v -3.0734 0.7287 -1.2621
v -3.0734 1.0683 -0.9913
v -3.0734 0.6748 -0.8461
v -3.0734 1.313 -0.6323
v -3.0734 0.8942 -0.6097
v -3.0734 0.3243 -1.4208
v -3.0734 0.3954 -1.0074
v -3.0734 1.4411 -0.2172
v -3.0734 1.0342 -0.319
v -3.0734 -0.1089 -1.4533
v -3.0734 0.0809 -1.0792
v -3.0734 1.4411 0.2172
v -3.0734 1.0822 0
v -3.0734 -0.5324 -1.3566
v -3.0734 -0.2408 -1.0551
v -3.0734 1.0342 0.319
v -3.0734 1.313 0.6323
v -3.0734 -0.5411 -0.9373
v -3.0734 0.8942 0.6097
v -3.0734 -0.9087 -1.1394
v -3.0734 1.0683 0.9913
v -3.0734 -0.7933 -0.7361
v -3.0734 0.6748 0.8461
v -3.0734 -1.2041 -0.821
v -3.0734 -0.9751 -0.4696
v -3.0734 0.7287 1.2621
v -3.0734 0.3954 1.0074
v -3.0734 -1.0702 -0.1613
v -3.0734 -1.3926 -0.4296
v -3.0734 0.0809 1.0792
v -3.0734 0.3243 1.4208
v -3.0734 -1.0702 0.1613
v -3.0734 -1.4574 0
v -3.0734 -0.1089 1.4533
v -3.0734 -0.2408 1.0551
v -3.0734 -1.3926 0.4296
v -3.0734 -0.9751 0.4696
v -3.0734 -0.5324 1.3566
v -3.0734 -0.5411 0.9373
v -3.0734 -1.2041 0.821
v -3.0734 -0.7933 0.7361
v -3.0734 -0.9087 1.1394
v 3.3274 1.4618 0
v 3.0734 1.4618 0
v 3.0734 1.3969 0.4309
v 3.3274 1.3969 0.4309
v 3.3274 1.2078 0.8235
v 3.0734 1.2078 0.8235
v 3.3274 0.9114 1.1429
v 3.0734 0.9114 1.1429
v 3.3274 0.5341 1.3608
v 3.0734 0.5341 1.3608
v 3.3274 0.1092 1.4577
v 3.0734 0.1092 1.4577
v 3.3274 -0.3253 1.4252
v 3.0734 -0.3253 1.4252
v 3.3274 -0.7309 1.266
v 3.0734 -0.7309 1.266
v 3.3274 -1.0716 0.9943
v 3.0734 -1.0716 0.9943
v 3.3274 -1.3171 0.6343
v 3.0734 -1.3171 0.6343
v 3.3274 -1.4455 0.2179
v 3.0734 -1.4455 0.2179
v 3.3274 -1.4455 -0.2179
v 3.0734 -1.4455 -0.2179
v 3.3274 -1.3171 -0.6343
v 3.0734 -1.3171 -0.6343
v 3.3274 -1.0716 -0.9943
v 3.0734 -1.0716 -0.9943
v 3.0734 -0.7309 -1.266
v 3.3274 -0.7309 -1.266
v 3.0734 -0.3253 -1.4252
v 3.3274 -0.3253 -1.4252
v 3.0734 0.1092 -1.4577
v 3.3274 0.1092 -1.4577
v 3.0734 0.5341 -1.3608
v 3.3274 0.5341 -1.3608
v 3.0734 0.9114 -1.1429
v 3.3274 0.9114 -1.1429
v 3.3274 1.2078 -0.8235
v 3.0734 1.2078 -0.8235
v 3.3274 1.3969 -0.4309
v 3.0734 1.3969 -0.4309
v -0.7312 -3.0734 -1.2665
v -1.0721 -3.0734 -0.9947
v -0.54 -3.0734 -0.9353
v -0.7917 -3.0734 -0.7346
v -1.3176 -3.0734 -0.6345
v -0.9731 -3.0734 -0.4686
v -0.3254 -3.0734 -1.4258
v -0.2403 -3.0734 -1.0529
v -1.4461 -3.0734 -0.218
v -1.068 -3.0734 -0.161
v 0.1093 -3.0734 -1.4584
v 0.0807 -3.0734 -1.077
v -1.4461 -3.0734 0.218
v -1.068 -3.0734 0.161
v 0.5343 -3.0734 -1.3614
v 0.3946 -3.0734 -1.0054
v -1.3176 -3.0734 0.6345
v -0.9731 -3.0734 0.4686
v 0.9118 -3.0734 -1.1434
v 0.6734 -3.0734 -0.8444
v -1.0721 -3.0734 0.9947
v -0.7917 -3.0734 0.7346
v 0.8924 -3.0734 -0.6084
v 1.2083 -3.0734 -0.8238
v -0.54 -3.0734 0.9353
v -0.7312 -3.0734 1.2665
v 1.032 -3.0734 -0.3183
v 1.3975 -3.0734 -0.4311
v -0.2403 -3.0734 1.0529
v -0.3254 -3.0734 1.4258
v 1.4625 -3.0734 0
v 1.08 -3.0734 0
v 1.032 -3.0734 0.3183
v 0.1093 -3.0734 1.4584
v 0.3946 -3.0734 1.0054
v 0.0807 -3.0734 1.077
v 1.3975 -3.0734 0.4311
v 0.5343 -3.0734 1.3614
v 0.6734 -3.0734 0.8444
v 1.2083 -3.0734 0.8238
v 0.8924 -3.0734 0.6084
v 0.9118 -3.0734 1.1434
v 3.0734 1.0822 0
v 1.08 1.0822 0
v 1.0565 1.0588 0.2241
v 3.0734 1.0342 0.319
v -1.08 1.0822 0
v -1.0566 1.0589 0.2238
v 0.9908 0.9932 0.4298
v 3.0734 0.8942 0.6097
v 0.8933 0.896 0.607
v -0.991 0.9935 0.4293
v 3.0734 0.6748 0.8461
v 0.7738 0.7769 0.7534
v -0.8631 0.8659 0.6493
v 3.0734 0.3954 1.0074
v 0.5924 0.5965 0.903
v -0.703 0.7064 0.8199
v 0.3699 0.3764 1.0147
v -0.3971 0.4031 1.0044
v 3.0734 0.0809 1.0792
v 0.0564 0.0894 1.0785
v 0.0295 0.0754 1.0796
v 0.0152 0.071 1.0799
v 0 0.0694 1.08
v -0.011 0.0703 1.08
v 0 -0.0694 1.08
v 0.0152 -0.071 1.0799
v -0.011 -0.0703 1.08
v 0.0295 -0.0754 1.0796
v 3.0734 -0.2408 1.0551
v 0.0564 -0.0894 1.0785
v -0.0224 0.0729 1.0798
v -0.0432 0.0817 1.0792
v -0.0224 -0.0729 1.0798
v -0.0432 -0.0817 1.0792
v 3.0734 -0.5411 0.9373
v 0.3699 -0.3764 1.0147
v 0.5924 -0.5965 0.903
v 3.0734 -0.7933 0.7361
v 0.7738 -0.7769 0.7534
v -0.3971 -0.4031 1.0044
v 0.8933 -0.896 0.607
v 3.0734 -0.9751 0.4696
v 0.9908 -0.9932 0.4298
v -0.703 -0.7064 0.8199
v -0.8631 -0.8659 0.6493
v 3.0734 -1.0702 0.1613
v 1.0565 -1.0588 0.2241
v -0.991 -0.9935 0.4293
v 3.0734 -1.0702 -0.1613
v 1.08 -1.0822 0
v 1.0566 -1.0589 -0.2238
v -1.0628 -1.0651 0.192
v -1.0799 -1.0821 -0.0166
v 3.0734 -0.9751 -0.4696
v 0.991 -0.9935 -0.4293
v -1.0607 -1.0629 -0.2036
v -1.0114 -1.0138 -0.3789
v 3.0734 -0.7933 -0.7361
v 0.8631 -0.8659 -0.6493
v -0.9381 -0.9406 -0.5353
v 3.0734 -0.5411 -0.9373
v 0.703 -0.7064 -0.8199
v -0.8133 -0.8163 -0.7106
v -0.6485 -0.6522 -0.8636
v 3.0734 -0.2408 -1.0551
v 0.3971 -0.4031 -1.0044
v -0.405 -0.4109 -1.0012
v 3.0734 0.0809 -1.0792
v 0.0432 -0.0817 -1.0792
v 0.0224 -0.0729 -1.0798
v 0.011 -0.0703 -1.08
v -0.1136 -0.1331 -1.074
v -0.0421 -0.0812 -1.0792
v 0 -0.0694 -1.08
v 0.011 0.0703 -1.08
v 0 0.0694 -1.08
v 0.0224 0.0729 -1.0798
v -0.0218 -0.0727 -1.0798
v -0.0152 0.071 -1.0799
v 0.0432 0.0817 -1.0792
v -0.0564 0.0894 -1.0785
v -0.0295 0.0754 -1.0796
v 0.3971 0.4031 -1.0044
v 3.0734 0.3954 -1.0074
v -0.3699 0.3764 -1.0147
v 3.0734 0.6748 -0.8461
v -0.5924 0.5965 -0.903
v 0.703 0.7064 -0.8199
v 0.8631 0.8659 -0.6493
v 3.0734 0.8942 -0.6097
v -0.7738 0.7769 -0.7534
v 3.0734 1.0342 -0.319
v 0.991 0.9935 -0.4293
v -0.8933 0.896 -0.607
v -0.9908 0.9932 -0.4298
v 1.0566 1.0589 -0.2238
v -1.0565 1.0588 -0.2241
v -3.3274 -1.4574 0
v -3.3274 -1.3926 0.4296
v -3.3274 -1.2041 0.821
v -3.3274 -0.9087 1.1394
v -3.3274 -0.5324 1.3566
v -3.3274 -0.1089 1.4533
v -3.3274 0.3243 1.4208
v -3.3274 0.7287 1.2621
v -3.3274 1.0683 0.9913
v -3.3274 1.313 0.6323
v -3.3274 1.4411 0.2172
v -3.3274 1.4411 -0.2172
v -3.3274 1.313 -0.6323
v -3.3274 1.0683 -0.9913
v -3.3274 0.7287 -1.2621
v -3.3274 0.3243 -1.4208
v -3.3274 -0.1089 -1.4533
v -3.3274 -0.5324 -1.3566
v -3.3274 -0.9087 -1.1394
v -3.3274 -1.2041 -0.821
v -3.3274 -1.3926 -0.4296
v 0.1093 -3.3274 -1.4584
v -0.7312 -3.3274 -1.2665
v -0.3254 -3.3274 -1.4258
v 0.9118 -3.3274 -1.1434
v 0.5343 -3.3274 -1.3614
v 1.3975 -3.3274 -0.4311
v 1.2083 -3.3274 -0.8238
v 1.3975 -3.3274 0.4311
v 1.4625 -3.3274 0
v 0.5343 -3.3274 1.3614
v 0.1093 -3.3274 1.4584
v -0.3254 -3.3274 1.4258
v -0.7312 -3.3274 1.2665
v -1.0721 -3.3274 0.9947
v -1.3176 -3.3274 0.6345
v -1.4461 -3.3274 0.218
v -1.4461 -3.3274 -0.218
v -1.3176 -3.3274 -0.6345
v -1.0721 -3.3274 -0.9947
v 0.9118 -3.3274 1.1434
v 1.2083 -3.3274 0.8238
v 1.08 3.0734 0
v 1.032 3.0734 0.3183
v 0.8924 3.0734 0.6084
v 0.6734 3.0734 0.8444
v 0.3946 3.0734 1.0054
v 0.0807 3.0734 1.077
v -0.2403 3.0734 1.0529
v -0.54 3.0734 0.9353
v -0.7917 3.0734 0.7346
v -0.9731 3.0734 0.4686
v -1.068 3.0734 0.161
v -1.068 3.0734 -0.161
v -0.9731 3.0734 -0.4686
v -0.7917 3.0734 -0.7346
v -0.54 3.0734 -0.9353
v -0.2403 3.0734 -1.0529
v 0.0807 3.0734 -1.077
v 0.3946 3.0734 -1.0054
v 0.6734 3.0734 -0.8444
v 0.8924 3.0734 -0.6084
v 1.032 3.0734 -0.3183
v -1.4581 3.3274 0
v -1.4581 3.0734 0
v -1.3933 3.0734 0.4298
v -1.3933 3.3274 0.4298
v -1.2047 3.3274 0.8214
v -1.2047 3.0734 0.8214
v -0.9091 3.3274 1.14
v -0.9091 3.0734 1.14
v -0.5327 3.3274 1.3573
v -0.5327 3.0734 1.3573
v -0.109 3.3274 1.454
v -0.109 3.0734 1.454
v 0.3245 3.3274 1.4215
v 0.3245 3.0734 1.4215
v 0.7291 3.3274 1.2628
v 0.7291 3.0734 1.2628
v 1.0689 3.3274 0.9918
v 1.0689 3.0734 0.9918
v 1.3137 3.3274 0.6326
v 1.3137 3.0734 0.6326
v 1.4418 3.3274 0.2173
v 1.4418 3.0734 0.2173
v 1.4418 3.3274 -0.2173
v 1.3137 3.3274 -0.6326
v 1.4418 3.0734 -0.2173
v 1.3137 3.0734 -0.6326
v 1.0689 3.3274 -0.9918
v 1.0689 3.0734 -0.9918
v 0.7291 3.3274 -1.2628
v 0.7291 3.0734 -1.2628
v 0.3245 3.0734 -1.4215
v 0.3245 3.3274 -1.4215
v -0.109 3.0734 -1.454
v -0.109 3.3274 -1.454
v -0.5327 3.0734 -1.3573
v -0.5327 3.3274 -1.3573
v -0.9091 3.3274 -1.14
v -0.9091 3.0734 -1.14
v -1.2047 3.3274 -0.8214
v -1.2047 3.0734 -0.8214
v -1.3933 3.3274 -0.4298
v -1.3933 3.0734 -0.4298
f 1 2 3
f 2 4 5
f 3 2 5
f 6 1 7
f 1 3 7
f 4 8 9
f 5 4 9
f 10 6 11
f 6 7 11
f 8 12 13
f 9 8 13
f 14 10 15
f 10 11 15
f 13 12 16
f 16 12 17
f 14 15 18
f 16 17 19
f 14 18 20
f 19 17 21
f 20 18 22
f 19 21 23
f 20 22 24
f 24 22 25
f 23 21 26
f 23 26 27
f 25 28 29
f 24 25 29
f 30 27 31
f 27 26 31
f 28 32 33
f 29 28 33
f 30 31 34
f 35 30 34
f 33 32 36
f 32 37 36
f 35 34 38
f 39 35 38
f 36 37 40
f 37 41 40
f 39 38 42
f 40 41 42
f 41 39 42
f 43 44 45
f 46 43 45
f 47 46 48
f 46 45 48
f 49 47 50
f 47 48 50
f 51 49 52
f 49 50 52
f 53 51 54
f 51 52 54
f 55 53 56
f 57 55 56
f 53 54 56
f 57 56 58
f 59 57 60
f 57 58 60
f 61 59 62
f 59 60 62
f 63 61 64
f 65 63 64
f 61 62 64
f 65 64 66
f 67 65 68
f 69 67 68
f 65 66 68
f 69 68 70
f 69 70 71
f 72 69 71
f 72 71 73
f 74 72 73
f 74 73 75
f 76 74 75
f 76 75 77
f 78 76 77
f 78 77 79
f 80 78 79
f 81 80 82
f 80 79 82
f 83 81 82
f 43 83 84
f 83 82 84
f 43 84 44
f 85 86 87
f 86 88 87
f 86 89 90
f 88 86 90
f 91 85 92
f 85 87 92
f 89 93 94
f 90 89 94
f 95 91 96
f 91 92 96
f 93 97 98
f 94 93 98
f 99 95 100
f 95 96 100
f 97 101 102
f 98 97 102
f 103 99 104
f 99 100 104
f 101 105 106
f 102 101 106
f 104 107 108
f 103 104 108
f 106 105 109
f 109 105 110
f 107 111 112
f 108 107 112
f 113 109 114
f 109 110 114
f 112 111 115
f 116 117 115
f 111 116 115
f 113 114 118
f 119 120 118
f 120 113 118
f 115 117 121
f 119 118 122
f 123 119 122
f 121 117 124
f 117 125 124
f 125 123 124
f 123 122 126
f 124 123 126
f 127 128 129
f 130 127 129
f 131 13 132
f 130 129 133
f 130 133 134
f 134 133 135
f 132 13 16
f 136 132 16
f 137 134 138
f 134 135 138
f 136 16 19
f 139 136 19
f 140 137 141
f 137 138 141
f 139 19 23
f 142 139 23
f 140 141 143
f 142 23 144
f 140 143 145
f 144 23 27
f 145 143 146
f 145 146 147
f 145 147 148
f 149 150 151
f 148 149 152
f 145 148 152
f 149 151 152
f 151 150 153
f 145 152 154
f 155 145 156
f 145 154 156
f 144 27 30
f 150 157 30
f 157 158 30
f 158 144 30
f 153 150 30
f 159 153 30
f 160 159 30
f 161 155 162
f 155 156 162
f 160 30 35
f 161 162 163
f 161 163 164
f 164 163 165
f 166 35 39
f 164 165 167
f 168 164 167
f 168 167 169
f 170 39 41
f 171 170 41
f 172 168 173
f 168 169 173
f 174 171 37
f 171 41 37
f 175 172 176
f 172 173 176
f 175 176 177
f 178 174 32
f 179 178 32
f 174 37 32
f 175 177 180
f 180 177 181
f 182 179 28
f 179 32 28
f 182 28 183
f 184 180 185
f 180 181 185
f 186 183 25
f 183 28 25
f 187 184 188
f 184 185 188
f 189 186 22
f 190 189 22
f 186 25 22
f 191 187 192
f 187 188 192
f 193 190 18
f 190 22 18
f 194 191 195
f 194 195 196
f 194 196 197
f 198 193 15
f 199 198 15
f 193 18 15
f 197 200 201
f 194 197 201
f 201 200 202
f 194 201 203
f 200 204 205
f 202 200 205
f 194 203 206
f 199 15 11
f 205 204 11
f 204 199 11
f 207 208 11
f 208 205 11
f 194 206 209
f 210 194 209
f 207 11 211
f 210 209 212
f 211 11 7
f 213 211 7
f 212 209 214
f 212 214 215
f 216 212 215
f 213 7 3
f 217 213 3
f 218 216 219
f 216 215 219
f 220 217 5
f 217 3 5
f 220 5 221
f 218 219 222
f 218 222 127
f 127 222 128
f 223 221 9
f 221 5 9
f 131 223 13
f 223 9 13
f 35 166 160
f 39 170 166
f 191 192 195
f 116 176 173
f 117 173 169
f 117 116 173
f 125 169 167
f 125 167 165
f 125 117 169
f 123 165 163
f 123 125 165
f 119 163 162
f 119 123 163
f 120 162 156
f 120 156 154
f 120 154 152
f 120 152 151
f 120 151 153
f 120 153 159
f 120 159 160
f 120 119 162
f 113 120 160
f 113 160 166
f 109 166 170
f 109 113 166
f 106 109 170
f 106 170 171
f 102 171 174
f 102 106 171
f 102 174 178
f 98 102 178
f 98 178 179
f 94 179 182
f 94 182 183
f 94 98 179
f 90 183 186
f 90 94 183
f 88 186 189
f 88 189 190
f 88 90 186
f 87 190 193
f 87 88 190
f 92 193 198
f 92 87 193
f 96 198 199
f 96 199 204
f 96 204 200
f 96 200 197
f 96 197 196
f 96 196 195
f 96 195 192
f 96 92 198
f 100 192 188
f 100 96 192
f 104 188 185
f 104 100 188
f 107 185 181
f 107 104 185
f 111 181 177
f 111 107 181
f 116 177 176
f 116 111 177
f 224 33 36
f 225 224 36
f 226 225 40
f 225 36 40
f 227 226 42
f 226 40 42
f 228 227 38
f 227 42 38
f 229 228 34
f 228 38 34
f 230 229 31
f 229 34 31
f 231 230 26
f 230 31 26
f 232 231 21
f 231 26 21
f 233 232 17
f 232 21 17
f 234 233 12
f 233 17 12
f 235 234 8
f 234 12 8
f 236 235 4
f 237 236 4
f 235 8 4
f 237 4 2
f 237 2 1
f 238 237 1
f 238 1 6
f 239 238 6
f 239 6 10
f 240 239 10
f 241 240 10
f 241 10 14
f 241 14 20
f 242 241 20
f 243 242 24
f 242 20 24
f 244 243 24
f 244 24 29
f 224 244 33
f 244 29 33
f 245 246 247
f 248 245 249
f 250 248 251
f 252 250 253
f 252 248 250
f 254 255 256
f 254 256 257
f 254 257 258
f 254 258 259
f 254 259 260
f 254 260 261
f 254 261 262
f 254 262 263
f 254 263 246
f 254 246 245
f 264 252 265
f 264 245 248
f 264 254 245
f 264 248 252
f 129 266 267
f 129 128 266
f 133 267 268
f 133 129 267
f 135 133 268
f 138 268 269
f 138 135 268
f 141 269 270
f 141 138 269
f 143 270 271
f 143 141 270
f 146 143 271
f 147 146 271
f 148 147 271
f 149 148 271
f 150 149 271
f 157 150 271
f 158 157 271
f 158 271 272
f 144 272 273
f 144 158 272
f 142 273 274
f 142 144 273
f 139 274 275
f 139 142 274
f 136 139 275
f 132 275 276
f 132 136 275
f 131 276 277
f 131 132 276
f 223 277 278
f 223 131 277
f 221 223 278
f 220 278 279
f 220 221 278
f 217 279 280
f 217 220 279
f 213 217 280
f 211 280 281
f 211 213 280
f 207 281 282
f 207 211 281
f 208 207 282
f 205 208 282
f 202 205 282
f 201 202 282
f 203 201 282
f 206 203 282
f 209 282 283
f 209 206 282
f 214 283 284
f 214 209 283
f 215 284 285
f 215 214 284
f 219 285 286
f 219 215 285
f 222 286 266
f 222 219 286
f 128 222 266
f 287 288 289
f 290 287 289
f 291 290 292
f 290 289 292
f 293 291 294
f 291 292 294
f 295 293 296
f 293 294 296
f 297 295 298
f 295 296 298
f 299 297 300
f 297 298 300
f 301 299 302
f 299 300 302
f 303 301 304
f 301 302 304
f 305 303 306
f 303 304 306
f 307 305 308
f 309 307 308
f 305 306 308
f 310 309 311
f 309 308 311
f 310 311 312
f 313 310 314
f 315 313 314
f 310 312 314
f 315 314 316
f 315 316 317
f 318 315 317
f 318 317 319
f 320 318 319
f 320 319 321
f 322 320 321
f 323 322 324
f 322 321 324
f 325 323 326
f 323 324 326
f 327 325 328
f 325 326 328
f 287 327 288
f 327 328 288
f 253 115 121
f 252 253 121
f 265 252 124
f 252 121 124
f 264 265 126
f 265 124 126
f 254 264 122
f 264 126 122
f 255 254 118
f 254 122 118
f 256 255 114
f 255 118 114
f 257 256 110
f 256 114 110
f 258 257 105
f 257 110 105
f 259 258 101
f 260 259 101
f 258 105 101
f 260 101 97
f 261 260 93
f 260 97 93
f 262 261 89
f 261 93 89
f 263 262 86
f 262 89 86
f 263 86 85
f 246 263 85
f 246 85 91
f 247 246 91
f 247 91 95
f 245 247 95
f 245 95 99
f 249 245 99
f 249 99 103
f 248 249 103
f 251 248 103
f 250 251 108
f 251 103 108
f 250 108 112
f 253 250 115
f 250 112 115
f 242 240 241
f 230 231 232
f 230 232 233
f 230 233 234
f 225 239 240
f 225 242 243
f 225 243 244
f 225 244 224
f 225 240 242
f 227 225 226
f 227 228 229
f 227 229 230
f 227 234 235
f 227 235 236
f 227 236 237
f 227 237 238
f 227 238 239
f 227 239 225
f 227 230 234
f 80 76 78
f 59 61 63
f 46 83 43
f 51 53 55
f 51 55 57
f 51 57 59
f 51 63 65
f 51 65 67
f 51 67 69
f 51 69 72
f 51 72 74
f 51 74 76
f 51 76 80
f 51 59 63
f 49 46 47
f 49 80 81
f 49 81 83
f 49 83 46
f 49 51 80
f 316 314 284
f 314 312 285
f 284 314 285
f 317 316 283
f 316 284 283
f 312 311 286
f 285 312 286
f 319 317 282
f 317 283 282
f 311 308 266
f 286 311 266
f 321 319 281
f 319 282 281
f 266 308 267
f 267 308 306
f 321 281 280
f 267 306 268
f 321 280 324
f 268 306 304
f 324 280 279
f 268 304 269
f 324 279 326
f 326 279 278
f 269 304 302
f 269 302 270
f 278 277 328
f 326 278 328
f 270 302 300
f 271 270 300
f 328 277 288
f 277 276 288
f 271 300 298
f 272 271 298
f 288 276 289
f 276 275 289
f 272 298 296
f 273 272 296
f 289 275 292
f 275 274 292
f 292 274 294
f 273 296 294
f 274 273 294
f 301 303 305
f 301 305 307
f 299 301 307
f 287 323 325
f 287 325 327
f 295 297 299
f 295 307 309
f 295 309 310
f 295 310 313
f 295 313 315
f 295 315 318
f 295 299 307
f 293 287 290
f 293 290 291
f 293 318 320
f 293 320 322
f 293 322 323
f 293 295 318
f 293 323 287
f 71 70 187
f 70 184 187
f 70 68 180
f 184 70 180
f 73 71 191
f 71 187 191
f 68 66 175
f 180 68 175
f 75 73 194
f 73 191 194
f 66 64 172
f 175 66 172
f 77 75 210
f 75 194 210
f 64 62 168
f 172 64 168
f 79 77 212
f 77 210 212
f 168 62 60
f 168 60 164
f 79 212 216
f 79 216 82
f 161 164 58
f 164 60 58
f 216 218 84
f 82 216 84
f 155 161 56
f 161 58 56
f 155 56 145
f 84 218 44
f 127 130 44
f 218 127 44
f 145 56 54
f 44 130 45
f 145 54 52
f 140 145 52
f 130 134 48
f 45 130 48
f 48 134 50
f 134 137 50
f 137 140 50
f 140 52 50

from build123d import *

# Parameters (mm, degrees)
F0_R          = 1.080022686
F1_DEPTH      = 3.0734
F1_DEPTH_BACK = 3.0734
F2_R          = 1.0822492619
F3_DEPTH      = 3.0734
F3_DEPTH_BACK = 3.0734
F4_R          = 1.4624555287
F5_DEPTH      = 0.254
F6_R          = 1.4618158242
F7_DEPTH      = 0.254
F8_R          = 1.4581045409
F9_DEPTH      = 0.254
F10_R         = 1.4573675157
F11_DEPTH     = 0.254


with BuildPart() as f1:
    # F0 (on Front) → F1 (new body, two sides)
    with BuildSketch(Plane.XZ) as f1_sk:
        Circle(F0_R)
    extrude(amount=F1_DEPTH)
    extrude(f1_sk.sketch, amount=-F1_DEPTH_BACK)

    # F2 (on Right) → F3 (join, two sides)
    with BuildSketch(Plane.YZ) as f3_sk:
        Circle(F2_R)
    extrude(amount=F3_DEPTH)
    extrude(f3_sk.sketch, amount=-F3_DEPTH_BACK)

    # F4 (on face) → F5 (join)
    with BuildSketch(Plane.XZ.offset(3.0734)):
        Circle(F4_R)
    extrude(amount=F5_DEPTH)

    # F6 (on face) → F7 (join)
    with BuildSketch(Plane.YZ.offset(3.0734)):
        Circle(F6_R)
    extrude(amount=F7_DEPTH)

    # F8 (on face) → F9 (join)
    with BuildSketch(Plane(origin=(0, 3.0734, 0), x_dir=(-1, 0, 0), z_dir=(0, 1, 0))):
        Circle(F8_R)
    extrude(amount=F9_DEPTH)

    # F10 (on face) → F11 (join)
    with BuildSketch(Plane(origin=(-3.0734, 0, 0), x_dir=(0, -1, 0), z_dir=(-1, 0, 0))):
        Circle(F10_R)
    extrude(amount=F11_DEPTH)


solid = f1.part
